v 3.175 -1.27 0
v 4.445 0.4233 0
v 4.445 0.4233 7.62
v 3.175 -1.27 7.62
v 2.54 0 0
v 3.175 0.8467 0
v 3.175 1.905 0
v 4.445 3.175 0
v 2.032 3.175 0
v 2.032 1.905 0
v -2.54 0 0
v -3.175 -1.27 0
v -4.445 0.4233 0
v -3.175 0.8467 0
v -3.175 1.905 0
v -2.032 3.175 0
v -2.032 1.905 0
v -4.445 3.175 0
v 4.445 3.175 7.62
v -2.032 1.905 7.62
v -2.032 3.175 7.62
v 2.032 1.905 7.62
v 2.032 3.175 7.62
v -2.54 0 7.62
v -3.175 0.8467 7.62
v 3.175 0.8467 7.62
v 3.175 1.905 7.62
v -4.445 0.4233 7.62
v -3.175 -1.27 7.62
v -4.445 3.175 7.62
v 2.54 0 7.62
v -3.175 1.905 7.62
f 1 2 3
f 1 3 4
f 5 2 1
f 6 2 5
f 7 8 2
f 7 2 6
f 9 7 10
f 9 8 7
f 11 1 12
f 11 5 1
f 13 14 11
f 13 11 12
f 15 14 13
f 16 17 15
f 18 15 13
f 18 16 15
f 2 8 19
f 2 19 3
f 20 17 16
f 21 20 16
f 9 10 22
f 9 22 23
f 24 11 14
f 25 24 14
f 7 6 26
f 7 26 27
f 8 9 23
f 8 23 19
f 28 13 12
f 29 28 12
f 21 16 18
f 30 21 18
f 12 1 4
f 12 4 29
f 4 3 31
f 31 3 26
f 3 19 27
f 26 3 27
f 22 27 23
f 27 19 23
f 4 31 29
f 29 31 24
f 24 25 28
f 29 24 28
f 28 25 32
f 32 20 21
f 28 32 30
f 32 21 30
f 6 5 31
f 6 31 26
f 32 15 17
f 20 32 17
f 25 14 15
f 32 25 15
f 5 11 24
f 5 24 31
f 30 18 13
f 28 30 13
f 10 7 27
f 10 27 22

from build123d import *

# Parameters (mm, degrees)
EXTRUDE_THIN1_DEPTH = 7.62


with BuildPart() as part:
    # Sketch1 → Extrude-Thin1 (new body)
    with BuildSketch(Plane.XY):
        Polygon((0, 0), (-2.54, 0), (-3.175, 0.846666667), (-3.175, 1.905), (-2.032, 1.905), (-2.032, 3.175), (-4.445, 3.175), (-4.445, 0.423333333), (-3.175, -1.27), (0, -1.27), align=None)
    extrude(amount=EXTRUDE_THIN1_DEPTH)

    # Mirror1: part across plane


with BuildPart() as part_1:
    add(part.part)
    add(part.part.mirror(Plane(origin=(0, 0, 7.62), x_dir=(0, 0, 1), z_dir=(1, 0, 0))))


solid = part_1.part
